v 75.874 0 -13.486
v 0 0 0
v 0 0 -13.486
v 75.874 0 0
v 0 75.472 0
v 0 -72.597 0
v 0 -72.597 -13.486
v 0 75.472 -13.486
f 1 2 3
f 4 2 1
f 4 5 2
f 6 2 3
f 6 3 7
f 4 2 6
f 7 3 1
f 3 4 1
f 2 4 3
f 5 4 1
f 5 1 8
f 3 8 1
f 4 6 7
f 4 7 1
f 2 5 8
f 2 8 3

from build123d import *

# Parameters (mm, degrees)
F2_DEPTH = 13.4864524007


with BuildPart() as f2:
    # F0 (on Top) → F2 (new body)
    with BuildSketch(Plane.XY):
        Polygon((0, 0), (75.8739262819, 0), (0, 75.4716470838), align=None)
    extrude(amount=-F2_DEPTH)


with BuildPart() as f2b:
    # F1 (on face) → F2, piece 2 (new body)
    with BuildSketch(Plane.XY):
        Polygon((0, 0), (0, -72.5966691971), (75.8739262819, 0), align=None)
    extrude(amount=-F2_DEPTH)


solid = Compound([f2.part, f2b.part])
